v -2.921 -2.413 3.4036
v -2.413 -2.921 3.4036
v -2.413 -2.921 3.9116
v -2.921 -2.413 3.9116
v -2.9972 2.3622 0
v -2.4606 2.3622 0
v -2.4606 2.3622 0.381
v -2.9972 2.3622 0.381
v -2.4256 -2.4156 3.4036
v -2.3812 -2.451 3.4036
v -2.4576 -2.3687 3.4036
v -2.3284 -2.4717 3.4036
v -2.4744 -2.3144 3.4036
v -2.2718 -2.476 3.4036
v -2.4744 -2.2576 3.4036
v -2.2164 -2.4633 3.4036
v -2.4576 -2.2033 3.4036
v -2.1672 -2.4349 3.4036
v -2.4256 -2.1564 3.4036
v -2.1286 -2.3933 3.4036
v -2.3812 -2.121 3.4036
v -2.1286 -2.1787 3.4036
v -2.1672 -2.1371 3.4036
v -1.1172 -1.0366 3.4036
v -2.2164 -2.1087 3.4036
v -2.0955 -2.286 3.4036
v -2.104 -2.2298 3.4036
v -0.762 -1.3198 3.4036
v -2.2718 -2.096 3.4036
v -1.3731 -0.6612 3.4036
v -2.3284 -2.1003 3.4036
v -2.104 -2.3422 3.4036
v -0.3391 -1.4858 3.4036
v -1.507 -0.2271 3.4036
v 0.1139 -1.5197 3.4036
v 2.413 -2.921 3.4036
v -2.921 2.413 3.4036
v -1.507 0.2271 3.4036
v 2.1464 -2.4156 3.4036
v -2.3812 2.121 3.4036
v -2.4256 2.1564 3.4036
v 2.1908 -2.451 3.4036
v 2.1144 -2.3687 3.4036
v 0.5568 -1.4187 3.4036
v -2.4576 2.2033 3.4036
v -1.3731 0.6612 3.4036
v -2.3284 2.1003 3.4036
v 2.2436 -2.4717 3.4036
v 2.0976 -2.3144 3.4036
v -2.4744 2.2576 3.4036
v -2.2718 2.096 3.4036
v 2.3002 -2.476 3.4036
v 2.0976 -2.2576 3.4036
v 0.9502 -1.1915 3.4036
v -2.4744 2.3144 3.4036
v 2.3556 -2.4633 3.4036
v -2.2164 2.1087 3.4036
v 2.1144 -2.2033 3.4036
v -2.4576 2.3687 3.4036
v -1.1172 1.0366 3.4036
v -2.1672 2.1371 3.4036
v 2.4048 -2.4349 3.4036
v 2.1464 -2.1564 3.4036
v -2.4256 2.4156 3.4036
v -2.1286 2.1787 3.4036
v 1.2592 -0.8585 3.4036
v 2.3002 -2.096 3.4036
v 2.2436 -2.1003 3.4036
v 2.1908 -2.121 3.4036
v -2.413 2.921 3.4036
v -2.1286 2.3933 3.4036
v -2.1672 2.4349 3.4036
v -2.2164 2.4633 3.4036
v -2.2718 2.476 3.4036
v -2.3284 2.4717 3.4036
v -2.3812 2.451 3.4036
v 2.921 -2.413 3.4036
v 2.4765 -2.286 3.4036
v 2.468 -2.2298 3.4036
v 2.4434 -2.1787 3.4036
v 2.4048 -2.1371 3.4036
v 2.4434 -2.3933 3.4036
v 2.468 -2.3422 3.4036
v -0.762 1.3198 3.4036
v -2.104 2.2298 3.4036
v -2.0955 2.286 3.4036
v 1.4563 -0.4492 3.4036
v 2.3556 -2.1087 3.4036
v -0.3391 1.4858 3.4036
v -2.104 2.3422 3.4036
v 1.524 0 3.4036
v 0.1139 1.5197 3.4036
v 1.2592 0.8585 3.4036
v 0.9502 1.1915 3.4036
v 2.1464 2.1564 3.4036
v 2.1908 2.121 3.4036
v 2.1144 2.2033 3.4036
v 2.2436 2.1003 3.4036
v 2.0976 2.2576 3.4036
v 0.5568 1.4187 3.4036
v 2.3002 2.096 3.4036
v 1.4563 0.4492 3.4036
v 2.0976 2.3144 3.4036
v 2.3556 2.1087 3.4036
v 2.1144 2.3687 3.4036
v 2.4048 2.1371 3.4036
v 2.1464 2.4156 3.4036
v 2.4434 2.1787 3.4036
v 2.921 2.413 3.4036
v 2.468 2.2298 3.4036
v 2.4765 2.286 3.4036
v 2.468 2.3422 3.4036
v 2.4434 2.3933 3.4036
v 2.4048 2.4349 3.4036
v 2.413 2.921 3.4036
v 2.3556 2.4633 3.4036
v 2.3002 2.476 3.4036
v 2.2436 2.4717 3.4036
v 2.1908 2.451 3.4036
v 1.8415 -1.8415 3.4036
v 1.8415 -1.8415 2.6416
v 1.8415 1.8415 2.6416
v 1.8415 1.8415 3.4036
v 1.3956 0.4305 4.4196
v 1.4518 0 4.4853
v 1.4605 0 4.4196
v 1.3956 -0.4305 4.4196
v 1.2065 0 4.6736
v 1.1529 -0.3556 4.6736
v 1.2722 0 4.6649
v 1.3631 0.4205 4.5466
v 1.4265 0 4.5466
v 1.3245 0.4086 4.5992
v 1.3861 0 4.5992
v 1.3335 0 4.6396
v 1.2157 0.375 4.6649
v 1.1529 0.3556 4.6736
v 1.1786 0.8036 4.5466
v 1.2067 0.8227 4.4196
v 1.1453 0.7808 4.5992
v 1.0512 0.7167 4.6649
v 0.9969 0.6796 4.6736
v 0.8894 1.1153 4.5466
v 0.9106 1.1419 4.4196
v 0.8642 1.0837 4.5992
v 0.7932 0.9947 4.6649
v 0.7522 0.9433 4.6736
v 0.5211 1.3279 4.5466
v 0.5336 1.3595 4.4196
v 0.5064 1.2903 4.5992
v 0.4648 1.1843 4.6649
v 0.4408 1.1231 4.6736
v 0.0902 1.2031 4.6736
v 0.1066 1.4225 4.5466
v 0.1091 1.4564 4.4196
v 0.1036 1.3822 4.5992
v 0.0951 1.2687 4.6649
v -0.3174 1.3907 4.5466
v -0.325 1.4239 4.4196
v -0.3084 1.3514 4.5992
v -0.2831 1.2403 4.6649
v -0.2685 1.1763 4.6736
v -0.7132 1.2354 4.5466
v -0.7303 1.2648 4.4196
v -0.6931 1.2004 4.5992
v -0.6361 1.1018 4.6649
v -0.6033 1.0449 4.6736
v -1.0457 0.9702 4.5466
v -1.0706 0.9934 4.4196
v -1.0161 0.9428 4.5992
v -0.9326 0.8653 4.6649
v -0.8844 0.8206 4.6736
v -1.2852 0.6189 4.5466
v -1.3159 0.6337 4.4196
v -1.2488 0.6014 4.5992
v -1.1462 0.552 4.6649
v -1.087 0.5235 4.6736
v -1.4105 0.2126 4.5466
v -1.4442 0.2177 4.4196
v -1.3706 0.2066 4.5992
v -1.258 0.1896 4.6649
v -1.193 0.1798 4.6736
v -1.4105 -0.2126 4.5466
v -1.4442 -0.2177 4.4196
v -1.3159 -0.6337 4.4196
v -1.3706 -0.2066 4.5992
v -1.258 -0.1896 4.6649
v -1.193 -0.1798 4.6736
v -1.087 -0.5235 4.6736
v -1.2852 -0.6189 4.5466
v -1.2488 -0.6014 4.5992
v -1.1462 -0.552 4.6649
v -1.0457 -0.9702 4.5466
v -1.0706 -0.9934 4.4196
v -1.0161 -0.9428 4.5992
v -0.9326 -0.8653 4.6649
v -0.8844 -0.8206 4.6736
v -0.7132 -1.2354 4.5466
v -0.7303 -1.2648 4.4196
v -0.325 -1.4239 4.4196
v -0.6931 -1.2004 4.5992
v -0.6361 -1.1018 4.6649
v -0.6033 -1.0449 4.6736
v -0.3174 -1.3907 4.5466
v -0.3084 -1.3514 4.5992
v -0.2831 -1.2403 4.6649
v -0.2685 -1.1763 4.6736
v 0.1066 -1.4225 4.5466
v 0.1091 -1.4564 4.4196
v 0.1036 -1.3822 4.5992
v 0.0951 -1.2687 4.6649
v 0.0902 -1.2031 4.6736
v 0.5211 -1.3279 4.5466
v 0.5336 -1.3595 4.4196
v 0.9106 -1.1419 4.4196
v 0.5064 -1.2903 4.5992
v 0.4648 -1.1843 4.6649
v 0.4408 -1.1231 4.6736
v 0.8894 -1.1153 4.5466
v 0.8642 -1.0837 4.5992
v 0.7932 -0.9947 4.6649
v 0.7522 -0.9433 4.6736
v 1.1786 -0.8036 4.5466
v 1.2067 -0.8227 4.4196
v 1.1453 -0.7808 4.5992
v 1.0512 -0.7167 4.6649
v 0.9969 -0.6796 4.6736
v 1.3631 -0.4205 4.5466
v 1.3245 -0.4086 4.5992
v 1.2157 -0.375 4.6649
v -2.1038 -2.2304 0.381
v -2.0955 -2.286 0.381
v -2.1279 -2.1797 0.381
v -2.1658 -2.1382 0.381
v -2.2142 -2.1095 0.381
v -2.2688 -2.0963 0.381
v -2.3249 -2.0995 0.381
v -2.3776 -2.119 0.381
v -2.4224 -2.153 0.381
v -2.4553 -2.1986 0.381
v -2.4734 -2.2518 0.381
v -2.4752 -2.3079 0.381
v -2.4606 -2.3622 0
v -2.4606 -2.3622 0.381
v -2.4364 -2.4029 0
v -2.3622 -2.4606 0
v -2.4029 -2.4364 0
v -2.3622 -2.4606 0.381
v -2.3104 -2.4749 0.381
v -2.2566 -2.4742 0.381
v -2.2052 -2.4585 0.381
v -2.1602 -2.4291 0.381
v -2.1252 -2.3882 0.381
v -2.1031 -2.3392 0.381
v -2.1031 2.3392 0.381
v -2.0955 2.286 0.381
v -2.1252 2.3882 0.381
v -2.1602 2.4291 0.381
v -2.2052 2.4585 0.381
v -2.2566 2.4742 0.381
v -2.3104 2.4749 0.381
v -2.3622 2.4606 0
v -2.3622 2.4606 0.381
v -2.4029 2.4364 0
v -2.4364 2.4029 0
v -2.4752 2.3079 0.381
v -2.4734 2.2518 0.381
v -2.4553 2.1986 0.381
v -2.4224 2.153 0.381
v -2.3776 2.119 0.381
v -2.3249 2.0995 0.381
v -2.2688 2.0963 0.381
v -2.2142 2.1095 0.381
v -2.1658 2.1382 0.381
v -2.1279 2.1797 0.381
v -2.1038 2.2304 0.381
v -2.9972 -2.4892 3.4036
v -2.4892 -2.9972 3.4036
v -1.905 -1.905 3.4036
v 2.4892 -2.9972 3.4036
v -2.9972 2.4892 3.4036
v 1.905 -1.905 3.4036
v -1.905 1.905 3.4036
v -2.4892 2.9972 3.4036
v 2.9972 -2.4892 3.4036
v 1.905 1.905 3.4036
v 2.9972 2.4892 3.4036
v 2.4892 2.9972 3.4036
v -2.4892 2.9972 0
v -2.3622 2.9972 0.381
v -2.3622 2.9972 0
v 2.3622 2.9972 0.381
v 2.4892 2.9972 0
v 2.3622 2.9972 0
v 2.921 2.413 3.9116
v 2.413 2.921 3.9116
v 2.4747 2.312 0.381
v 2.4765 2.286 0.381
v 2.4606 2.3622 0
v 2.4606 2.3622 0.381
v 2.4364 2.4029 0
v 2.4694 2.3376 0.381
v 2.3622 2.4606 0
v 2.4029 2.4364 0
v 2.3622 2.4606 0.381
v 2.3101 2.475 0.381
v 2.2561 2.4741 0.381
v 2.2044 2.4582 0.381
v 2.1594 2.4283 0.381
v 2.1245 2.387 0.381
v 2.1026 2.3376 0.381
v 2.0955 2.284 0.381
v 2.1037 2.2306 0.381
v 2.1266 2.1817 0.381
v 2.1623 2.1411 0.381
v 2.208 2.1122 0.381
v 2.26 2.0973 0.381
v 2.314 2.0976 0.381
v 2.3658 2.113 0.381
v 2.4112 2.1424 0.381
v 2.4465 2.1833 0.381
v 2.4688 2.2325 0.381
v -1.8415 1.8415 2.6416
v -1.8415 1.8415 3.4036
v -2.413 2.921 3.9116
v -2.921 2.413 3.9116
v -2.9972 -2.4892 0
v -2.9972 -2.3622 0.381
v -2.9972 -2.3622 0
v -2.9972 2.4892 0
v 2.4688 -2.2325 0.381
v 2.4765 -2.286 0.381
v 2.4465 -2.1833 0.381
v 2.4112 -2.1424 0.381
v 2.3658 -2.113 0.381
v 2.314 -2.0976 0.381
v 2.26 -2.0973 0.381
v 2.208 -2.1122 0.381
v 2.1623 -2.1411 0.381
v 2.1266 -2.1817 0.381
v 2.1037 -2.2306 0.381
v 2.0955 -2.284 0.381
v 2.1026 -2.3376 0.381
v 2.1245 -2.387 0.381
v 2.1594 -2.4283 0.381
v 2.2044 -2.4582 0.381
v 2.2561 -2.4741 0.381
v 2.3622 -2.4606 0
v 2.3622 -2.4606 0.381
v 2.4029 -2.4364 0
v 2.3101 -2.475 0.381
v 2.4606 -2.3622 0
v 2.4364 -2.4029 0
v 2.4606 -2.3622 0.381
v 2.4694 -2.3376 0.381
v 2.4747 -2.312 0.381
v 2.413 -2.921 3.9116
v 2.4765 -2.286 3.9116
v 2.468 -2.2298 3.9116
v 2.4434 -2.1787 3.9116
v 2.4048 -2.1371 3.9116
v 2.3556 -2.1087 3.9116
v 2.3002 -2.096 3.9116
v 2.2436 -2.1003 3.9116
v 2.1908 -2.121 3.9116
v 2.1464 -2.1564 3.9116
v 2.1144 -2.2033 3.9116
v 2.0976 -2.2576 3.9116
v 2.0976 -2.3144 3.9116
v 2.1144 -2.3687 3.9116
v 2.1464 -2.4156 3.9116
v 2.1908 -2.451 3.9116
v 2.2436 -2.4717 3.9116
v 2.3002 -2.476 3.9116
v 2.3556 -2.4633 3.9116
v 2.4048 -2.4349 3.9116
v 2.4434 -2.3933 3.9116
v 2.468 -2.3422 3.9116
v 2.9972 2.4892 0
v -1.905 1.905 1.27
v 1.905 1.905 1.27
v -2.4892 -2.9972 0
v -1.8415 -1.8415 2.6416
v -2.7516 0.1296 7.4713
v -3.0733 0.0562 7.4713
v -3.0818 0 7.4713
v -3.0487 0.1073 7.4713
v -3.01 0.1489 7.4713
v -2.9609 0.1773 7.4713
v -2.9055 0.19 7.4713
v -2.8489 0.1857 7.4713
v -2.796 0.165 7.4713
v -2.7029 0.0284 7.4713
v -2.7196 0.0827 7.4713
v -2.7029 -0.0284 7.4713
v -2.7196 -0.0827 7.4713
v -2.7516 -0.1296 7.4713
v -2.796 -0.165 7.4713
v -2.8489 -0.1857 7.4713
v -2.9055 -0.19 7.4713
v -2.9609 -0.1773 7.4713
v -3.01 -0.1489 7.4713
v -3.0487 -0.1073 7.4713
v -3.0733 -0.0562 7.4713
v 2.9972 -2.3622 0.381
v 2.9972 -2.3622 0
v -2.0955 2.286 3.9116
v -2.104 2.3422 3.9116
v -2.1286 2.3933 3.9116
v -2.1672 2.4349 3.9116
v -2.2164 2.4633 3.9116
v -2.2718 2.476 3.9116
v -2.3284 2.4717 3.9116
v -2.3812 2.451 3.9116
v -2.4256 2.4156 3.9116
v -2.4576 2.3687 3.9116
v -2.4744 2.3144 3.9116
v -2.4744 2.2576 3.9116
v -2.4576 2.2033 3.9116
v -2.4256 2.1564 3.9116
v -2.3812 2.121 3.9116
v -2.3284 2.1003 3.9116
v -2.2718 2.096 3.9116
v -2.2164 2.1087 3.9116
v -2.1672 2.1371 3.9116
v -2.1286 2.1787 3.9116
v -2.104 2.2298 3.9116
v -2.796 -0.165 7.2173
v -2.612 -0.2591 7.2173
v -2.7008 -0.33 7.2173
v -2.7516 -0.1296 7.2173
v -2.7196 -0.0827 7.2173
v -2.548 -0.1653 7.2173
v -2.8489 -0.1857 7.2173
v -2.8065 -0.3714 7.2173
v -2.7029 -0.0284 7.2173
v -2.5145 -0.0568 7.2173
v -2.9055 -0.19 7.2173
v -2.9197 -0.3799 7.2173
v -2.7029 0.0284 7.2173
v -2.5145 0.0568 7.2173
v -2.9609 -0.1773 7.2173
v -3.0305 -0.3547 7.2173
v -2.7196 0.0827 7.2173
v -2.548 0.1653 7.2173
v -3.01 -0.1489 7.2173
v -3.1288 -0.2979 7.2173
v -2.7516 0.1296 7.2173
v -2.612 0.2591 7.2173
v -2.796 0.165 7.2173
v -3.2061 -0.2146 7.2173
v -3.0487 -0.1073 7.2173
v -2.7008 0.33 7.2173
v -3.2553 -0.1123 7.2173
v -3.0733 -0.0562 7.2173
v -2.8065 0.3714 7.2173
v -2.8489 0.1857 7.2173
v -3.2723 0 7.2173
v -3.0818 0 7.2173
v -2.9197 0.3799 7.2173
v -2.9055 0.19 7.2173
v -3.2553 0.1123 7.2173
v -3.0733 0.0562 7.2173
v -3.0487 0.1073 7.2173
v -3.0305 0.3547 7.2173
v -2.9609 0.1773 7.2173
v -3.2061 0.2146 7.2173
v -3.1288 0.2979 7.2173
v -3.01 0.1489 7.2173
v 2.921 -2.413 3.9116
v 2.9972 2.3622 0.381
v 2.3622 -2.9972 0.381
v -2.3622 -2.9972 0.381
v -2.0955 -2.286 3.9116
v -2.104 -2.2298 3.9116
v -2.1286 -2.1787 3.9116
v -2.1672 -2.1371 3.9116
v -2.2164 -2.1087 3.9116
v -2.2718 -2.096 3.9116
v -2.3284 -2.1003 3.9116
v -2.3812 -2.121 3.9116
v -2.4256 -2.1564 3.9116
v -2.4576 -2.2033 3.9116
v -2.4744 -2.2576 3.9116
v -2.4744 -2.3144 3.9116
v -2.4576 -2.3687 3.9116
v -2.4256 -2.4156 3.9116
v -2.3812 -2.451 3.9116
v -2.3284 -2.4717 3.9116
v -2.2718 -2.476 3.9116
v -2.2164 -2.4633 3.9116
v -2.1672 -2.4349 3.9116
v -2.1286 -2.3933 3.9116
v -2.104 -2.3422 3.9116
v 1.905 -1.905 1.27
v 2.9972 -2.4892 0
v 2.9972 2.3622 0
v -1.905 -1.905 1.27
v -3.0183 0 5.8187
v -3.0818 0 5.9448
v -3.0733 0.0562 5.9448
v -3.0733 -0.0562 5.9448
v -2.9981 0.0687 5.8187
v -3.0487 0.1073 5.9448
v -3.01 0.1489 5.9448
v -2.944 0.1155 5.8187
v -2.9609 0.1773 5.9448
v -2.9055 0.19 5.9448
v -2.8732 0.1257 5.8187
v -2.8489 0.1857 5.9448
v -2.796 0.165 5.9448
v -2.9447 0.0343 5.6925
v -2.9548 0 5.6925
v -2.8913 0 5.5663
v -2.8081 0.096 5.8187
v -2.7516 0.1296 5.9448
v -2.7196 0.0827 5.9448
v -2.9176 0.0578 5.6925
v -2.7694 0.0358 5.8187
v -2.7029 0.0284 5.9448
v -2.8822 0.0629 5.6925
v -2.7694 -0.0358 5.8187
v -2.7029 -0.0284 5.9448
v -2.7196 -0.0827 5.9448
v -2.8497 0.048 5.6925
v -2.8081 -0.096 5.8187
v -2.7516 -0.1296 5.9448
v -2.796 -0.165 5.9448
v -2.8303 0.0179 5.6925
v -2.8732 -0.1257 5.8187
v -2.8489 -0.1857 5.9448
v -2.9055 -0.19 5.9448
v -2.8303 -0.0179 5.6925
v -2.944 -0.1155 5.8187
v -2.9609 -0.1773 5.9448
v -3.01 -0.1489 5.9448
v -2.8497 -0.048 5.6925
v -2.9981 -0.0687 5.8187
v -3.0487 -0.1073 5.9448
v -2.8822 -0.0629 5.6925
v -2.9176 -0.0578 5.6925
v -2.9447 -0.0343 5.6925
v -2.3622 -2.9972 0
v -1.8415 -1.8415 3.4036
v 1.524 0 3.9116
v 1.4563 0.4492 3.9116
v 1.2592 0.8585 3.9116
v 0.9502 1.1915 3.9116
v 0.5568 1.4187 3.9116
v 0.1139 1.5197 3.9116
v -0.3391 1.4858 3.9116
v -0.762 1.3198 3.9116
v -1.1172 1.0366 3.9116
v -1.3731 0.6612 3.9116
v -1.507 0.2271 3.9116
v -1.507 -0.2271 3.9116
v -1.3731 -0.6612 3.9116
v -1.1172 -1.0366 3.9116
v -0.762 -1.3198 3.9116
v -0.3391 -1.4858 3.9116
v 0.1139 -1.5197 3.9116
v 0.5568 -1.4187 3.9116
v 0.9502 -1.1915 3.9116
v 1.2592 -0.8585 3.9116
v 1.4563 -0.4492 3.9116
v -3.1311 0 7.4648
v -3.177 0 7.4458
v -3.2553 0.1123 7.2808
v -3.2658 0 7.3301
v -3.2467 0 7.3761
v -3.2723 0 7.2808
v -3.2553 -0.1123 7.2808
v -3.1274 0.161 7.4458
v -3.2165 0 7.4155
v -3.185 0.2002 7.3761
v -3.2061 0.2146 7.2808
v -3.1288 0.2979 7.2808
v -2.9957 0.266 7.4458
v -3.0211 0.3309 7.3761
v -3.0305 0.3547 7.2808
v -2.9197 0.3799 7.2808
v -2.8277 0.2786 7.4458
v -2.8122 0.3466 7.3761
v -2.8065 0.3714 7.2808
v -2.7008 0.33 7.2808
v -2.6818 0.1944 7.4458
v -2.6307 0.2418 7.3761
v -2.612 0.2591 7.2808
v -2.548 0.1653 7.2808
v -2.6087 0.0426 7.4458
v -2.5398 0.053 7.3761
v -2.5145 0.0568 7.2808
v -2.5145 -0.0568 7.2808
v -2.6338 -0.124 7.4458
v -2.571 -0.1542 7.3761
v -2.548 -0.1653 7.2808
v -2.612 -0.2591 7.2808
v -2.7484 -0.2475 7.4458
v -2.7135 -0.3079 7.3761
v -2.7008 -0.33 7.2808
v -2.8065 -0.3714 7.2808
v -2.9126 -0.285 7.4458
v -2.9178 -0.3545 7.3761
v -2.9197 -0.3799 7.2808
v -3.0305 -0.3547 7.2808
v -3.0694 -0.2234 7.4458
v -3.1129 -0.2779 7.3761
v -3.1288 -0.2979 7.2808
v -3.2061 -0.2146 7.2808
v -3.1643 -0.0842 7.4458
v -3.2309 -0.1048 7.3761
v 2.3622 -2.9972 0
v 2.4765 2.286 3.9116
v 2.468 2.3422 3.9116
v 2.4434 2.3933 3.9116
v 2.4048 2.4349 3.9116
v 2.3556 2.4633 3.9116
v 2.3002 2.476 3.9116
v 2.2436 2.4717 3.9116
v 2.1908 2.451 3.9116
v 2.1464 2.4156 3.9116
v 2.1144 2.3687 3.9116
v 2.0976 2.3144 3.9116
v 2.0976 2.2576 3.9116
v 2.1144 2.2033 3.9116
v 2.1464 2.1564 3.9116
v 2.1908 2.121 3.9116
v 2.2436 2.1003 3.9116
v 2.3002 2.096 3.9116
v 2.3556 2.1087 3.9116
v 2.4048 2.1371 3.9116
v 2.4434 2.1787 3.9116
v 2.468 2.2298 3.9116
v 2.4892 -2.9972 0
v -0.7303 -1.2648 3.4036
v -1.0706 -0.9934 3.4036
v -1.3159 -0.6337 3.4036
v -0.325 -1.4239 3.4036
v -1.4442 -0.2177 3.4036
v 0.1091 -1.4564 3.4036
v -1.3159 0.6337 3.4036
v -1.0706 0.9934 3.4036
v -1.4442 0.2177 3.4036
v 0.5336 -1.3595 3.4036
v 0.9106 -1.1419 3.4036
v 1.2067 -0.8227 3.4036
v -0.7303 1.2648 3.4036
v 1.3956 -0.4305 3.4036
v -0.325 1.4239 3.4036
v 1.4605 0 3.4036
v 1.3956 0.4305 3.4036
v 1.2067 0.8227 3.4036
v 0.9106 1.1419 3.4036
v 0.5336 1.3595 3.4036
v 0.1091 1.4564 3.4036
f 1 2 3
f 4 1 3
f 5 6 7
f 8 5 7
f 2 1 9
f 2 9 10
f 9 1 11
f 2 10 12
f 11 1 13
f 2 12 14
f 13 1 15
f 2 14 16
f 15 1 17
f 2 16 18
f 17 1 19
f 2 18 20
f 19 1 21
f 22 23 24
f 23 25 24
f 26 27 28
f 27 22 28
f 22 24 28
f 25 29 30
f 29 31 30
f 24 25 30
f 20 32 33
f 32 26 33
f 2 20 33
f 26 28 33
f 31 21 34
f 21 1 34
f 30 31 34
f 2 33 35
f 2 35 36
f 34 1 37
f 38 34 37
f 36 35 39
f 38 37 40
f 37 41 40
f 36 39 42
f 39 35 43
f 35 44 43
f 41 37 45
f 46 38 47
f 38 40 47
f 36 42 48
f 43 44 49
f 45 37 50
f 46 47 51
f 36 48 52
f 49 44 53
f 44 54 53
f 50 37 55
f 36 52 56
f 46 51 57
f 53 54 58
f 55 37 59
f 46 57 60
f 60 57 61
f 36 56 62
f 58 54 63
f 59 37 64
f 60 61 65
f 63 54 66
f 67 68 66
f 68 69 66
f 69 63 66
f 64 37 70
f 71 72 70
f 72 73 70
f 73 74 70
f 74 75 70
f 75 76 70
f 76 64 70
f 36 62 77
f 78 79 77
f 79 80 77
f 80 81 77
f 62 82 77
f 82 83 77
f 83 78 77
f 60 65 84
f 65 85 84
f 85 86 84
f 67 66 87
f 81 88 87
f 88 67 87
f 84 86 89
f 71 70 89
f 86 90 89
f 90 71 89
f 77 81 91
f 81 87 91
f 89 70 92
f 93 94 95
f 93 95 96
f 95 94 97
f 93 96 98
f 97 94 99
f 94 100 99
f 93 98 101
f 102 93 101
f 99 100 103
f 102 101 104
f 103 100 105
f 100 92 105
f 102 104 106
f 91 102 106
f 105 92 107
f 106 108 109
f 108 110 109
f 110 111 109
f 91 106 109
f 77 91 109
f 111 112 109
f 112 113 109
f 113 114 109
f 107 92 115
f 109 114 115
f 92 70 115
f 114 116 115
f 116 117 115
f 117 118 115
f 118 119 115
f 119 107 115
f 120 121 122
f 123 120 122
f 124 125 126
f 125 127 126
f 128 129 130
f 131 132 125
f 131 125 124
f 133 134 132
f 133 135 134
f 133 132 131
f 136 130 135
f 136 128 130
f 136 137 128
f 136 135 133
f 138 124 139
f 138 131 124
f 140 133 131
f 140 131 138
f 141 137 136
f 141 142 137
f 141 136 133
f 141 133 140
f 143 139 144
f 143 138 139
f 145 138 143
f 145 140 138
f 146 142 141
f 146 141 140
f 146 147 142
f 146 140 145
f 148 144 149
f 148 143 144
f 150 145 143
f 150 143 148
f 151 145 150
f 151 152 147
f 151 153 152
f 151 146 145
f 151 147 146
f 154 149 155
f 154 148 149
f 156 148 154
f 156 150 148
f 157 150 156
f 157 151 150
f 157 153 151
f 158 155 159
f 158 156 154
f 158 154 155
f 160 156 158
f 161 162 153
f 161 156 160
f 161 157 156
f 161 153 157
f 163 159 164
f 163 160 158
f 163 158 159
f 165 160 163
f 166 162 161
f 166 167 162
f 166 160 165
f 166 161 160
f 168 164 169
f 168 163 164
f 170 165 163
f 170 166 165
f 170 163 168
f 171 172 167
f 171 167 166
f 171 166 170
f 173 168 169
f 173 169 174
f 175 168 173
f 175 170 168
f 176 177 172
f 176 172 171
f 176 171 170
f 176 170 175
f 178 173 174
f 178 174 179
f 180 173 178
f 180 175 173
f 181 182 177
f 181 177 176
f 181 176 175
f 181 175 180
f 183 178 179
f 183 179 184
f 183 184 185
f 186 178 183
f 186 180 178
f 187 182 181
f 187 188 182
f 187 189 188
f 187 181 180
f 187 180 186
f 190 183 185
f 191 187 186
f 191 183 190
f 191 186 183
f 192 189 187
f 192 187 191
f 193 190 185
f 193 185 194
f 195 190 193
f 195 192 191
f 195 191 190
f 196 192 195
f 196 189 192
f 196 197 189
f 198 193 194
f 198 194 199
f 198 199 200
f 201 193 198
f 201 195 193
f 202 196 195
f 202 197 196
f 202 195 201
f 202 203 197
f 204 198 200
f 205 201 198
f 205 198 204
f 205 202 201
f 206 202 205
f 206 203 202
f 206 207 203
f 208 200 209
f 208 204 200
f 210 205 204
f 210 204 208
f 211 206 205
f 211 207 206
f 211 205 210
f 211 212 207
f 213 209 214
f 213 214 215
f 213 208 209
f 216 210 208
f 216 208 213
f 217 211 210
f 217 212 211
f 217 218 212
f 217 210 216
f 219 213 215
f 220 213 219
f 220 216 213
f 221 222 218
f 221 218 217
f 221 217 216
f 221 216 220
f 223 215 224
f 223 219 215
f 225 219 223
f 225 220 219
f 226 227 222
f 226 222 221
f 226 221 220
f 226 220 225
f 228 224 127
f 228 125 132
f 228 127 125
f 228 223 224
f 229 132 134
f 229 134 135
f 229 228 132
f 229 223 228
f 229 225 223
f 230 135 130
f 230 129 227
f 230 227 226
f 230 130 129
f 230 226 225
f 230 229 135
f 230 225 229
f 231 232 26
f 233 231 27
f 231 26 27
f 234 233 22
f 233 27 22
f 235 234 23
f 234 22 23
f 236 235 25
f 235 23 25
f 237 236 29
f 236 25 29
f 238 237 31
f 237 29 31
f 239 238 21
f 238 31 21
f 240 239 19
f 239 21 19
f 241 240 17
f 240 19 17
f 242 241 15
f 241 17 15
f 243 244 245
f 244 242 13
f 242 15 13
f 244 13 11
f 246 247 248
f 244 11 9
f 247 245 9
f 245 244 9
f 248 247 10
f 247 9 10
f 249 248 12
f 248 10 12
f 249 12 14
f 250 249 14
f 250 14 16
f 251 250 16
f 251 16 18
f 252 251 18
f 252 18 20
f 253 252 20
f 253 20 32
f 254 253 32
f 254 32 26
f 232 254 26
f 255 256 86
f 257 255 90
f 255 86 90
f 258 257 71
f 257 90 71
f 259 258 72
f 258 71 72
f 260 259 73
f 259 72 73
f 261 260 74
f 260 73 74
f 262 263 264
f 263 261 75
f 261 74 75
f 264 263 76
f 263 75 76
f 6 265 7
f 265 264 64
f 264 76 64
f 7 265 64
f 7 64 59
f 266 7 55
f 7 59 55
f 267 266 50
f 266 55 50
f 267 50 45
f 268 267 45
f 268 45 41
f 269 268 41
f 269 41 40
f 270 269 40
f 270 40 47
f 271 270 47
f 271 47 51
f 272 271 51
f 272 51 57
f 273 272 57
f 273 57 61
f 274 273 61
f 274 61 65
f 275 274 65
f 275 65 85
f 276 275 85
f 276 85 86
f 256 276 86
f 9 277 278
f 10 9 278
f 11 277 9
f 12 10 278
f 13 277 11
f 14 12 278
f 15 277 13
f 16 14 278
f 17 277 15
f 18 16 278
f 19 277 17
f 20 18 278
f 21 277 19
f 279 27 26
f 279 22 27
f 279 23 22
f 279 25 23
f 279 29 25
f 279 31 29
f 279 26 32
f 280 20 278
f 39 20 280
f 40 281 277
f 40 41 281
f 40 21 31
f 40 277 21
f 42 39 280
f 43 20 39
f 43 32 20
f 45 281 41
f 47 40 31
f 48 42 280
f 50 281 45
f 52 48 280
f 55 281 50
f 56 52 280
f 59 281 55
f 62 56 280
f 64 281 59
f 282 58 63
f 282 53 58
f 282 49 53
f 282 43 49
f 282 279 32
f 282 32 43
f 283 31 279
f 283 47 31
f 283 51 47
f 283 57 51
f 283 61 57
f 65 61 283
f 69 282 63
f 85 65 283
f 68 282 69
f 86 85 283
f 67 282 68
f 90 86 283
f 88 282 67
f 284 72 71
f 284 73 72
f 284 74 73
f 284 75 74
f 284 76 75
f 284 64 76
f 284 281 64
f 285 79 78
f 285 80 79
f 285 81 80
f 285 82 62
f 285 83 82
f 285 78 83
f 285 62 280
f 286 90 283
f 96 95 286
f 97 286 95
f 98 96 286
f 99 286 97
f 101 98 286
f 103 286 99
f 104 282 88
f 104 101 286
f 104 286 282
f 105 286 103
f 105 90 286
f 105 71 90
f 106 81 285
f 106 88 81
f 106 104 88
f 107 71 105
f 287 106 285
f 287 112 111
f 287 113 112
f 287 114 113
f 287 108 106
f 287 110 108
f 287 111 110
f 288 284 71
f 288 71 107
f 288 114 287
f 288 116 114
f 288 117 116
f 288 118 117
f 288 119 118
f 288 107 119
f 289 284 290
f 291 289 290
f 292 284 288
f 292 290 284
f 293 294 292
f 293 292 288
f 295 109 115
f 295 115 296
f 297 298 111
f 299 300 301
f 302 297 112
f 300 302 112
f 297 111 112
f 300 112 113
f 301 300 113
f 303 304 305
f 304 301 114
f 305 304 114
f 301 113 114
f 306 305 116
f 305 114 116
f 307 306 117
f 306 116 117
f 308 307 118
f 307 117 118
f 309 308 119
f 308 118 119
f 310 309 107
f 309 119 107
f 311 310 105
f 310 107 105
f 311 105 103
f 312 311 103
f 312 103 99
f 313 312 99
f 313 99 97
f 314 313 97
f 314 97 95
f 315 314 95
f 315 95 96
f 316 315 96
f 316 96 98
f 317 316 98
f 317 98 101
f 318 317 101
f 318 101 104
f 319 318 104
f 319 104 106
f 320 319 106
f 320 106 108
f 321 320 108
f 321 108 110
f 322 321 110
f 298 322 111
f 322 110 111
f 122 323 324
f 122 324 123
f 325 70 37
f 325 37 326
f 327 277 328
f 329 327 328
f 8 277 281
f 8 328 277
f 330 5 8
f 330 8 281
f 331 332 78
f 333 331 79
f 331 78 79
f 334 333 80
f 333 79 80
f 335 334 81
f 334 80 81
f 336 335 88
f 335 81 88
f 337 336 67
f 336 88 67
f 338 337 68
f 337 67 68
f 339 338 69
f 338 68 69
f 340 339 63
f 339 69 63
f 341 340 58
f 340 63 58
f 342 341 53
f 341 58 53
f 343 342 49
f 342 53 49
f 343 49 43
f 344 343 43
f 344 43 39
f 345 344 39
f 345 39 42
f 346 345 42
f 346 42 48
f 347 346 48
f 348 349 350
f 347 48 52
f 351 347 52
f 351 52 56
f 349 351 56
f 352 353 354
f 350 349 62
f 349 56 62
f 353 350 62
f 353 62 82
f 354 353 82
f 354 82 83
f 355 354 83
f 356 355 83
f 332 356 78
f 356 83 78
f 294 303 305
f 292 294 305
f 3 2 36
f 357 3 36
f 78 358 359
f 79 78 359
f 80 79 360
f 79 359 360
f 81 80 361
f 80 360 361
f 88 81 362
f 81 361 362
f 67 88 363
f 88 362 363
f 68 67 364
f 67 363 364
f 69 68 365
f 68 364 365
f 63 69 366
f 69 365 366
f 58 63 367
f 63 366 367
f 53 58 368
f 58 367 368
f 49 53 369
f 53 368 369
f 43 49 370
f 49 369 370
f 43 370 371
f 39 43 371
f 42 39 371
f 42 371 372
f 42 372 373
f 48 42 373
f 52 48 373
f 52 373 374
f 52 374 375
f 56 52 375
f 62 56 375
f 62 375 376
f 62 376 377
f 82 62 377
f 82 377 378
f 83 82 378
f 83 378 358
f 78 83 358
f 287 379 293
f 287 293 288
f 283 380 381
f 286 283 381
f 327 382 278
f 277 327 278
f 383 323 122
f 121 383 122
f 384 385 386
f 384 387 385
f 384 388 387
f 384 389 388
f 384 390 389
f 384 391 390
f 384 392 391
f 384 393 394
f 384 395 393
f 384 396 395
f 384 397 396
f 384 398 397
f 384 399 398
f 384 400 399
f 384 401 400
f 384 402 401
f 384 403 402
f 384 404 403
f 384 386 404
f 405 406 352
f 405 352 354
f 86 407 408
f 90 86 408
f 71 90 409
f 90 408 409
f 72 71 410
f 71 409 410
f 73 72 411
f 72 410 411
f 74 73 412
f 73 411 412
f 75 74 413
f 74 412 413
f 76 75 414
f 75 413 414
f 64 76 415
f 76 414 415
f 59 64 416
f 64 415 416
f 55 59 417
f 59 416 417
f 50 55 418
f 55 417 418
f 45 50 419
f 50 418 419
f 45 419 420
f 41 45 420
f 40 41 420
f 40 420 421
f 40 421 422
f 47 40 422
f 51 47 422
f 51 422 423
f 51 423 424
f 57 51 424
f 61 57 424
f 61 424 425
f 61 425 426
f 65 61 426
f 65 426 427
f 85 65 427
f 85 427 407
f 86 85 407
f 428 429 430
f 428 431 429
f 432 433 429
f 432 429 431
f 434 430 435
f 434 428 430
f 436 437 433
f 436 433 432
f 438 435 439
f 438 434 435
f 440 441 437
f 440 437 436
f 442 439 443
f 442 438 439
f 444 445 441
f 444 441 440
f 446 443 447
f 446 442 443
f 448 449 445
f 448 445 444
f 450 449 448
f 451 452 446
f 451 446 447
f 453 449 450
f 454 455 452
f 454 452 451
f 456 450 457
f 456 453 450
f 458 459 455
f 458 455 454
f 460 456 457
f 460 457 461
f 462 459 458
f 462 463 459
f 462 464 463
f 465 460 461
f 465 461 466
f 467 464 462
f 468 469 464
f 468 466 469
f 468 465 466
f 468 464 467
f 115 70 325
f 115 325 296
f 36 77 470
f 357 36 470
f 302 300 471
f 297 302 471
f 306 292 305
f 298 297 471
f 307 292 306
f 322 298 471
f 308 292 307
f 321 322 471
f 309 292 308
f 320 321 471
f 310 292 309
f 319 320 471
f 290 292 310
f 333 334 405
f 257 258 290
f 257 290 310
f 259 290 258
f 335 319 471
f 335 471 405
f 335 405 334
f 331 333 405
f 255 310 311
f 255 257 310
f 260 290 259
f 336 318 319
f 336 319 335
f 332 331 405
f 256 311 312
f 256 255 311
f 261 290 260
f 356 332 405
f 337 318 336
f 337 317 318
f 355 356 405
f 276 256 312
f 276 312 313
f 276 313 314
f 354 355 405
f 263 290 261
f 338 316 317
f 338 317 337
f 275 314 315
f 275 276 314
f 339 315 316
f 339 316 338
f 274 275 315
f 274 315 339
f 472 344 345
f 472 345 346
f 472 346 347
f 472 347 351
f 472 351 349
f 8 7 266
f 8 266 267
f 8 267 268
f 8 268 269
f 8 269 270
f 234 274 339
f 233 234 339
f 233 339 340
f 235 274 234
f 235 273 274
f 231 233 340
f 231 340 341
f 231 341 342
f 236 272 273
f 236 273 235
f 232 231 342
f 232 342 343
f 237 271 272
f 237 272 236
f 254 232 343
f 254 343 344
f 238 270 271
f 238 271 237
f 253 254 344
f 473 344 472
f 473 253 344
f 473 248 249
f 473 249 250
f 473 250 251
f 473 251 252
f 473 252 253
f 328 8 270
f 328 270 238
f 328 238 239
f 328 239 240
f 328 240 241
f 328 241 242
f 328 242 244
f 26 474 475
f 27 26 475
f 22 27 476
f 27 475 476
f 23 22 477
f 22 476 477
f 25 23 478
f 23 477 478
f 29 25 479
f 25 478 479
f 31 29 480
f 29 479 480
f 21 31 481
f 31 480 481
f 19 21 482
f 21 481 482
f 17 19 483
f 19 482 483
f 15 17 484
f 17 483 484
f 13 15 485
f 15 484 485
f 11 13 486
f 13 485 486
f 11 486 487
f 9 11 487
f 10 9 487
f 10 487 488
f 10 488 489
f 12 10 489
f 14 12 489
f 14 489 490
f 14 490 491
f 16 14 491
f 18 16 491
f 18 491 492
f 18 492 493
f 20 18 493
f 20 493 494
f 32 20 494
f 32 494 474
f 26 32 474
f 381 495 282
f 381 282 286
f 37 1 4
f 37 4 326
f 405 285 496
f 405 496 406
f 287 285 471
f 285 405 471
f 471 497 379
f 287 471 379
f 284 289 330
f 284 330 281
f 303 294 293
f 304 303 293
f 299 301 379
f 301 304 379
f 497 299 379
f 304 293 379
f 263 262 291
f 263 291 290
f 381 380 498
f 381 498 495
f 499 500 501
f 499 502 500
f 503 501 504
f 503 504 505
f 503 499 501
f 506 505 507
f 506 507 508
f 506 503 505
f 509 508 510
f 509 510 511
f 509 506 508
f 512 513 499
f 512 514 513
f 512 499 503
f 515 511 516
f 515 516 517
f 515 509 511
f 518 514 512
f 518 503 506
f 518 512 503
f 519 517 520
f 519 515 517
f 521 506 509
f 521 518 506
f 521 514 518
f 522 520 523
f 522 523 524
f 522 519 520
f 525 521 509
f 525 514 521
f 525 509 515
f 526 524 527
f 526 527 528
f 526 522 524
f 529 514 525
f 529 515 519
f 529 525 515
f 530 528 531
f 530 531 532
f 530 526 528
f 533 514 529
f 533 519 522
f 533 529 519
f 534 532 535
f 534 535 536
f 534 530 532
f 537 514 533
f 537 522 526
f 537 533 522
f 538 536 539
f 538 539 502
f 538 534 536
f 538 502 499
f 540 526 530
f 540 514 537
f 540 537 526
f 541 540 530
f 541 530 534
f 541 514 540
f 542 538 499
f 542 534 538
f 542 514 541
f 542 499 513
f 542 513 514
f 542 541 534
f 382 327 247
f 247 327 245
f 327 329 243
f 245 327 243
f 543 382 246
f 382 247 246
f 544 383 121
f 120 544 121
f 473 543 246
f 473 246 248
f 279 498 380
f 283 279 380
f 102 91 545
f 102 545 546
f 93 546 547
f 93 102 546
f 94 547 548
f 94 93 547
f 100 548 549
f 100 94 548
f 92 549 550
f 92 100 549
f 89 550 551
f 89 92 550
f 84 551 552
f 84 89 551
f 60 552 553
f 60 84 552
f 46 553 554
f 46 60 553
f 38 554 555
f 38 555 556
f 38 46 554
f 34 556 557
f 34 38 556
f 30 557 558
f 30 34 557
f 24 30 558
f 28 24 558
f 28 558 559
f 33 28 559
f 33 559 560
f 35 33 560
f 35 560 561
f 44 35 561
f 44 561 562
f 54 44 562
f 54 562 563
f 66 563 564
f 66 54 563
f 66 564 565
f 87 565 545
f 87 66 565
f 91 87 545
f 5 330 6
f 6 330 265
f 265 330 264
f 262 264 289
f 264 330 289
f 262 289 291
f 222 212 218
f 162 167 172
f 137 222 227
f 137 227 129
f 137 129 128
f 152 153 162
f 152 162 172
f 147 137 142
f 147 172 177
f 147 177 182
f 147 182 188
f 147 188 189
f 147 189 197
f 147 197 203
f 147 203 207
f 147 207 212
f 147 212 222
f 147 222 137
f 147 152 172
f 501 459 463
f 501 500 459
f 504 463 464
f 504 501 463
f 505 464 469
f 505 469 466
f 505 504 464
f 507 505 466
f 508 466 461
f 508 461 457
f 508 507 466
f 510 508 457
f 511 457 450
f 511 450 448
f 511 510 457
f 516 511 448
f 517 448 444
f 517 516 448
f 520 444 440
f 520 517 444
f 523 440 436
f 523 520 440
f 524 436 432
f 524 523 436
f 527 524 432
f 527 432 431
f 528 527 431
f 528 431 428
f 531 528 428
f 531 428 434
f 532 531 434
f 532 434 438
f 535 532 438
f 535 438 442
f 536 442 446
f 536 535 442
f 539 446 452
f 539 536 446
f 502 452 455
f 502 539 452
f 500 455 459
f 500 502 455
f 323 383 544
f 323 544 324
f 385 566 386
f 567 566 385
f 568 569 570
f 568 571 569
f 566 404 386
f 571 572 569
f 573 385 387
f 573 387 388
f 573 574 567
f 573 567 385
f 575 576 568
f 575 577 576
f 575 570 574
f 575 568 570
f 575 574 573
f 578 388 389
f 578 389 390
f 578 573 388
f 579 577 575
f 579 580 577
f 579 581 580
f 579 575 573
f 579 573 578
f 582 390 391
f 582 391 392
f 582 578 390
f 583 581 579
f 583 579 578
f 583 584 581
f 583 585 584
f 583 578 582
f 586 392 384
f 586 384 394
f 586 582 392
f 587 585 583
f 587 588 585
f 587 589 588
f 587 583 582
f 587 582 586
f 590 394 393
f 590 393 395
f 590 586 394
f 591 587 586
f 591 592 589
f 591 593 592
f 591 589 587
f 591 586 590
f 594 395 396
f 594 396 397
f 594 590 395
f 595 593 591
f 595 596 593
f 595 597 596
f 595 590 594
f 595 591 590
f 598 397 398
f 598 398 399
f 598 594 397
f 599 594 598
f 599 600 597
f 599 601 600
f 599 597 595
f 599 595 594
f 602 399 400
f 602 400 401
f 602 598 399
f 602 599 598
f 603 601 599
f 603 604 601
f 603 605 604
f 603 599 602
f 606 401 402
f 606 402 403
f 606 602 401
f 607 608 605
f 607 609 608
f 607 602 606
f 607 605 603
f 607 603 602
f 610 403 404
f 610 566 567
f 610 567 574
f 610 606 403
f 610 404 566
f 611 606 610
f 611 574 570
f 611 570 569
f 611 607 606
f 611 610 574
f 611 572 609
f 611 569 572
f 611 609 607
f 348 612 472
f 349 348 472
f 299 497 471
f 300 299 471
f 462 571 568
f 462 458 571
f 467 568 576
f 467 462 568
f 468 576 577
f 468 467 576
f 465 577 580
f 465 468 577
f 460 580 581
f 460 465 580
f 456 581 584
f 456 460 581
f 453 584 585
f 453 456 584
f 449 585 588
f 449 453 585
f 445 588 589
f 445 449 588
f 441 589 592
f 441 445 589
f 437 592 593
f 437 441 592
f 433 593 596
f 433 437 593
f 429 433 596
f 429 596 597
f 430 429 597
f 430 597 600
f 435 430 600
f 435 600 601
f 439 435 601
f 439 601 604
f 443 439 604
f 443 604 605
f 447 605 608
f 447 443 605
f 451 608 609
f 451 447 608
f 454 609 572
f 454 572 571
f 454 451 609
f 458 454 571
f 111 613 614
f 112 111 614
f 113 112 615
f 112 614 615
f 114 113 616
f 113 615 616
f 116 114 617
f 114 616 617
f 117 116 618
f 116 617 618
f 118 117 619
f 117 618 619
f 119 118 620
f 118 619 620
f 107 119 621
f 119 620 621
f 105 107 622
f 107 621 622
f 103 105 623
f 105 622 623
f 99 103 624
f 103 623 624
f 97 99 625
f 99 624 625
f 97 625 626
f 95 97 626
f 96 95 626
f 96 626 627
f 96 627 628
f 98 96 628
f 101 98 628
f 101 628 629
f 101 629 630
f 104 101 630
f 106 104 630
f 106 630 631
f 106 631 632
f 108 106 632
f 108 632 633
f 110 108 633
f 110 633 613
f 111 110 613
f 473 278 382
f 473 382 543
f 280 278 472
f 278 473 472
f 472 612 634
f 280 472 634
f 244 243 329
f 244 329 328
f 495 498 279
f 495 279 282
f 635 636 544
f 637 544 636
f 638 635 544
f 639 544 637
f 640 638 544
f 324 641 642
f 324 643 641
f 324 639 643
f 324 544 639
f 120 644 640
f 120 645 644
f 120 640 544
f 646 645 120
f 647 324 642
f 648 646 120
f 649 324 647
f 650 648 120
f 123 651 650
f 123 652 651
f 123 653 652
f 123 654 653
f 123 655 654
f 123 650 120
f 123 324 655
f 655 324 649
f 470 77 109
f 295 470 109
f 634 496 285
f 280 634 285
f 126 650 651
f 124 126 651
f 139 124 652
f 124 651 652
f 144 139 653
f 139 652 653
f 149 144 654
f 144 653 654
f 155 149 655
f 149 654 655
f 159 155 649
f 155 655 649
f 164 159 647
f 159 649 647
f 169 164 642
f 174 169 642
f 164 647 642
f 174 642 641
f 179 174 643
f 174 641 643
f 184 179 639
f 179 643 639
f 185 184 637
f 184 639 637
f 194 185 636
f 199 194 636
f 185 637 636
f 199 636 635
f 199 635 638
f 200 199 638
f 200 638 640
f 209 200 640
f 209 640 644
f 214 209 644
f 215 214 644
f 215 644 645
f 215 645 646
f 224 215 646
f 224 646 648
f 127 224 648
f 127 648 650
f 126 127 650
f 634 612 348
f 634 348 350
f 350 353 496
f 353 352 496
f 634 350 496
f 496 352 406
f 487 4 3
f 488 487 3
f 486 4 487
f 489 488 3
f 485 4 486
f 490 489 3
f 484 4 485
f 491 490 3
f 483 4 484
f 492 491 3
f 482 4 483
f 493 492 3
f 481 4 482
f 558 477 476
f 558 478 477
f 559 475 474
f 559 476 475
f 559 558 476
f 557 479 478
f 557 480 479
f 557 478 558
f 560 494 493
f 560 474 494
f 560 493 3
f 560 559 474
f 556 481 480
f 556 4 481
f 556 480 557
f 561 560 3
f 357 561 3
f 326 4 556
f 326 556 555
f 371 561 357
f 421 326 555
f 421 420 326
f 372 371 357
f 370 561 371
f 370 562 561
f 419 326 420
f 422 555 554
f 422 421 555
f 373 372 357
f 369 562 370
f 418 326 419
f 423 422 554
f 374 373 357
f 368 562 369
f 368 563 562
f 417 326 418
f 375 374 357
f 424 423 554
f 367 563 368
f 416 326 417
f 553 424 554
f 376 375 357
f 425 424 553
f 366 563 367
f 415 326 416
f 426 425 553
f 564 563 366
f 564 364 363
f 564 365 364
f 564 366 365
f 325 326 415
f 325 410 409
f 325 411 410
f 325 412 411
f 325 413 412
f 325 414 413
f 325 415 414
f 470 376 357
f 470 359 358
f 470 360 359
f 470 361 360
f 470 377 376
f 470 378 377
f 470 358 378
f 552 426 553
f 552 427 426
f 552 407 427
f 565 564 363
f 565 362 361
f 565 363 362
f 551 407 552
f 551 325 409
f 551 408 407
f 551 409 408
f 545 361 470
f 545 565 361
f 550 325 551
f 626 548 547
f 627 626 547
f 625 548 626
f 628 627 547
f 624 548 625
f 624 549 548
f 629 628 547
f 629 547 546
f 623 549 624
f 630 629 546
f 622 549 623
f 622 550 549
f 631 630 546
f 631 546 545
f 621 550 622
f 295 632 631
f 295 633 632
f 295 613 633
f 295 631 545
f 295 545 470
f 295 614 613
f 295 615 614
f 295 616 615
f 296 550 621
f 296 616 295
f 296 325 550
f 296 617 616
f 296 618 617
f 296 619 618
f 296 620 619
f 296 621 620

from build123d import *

# Parameters (mm, degrees)
F0_W      = 5.9944
F0_H      = 5.9944
F0_W_2    = 3.81
F0_H_2    = 3.81
F1_DEPTH  = 3.4036
F2_DEPTH  = 1.27
F3_W      = 4.7244
F3_H      = 0.381
F4_DEPTH  = 5.9944
F5_SIZE   = 0.508
F6_W      = 5.842
F6_H      = 5.842
F6_R      = 1.524
F7_DEPTH  = 0.508
F8_SIZE   = 0.508
F9_W      = 4.7244
F9_H      = 0.381
F10_DEPTH = 5.9944
F11_R     = 0.1905
F12_DEPTH = 25.4
F14_W     = 3.683
F14_H     = 3.683
F14_R     = 1.4605
F15_DEPTH = 0.762
F16_DEPTH = 2.032
F17_R     = 0.254


with BuildPart() as f1:
    # F0 (on Top) → F1 (new body)
    with BuildSketch(Plane.XY):
        Rectangle(F0_W, F0_H)
        Rectangle(F0_W_2, F0_H_2, mode=Mode.SUBTRACT)
    extrude(amount=F1_DEPTH)

    # F0 (on Top) → F2 (join)
    with BuildSketch(Plane.XY):
        Rectangle(F0_W_2, F0_H_2)
    extrude(amount=F2_DEPTH)

    # F3 (on face) → F4 (cut, through all)
    with BuildSketch(Plane.XZ.offset(2.9972)):
        with Locations((0, 0.1905)):
            Rectangle(F3_W, F3_H)
    extrude(amount=-F4_DEPTH, mode=Mode.SUBTRACT)

    # F5
    f5_edges = [f1.edges().sort_by_distance(p)[0] for p in [
        (-2.9972, -2.9972, 1.7018),
        (-2.9972, 2.9972, 1.7018),
        (2.9972, -2.9972, 1.7018),
        (2.9972, 2.9972, 1.7018),
    ]]
    chamfer(f5_edges, length=F5_SIZE)

    # F9 (on face) → F10 (cut, through all)
    with BuildSketch(Plane(origin=(-2.9972, 0, 0), x_dir=(0, -1, 0), z_dir=(-1, 0, 0))):
        with Locations((0, 0.1905)):
            Rectangle(F9_W, F9_H)
    extrude(amount=-F10_DEPTH, mode=Mode.SUBTRACT)


with BuildPart() as f7:
    # F6 (on face) → F7 (new body)
    with BuildSketch(Plane.XY.offset(3.4036)):
        Rectangle(F6_W, F6_H)
        Circle(F6_R, mode=Mode.SUBTRACT)
    extrude(amount=F7_DEPTH)

    # F8
    f8_edges = [f7.edges().sort_by_distance(p)[0] for p in [
        (-2.921, -2.921, 3.6576),
        (-2.921, 2.921, 3.6576),
        (2.921, 2.921, 3.6576),
        (2.921, -2.921, 3.6576),
    ]]
    chamfer(f8_edges, length=F8_SIZE)


with BuildPart() as f12_tool:
    # F11 (on face) → F12 (new body)
    with BuildSketch(Plane.XY.offset(3.9116)):
        with Locations((-2.286, 2.286)):
            Circle(F11_R)
        with Locations((-2.286, -2.286)):
            Circle(F11_R)
        with Locations((2.286, 2.286)):
            Circle(F11_R)
        with Locations((2.286, -2.286)):
            Circle(F11_R)
    extrude(amount=-F12_DEPTH)


with BuildPart() as f1_1:
    add(f1.part)

    # F12: cut by f12_tool
    add(f12_tool.part, mode=Mode.SUBTRACT)


with BuildPart() as f7_1:
    add(f7.part)

    # F12: cut by f12_tool
    add(f12_tool.part, mode=Mode.SUBTRACT)


with BuildPart() as f15:
    # F14 (on offset) → F15 (new body, through all)
    with BuildSketch(Plane.XY.offset(2.6416)):
        Rectangle(F14_W, F14_H)
        Circle(F14_R, mode=Mode.SUBTRACT)
    extrude(amount=F15_DEPTH)

    # F14 (on offset) → F16 (join)
    with BuildSketch(Plane.XY.offset(2.6416)):
        Circle(F14_R)
    extrude(amount=F16_DEPTH)

    # F17
    f17_edges = [f15.edges().sort_by_distance(p)[0] for p in [
        (-1.4605, 0, 4.6736),
    ]]
    fillet(f17_edges, radius=F17_R)


with BuildPart() as f19:
    # F18 (on Front) → F19 (revolve)
    with BuildSketch(Plane.XZ):
        with BuildLine():
            Line((-3.0817589723, 5.9448182583), (-2.8912589723, 5.5663371459))
            Line((-2.8912589723, 5.5663371459), (-2.8912589723, 7.4713371459))
            Line((-2.8912589723, 7.4713371459), (-3.0817589723, 7.4713371459))
            ThreePointArc((-3.0817589723, 7.4713371459), (-3.2164628141, 7.4155409877), (-3.2722589723, 7.2808371459))
            Line((-3.2722589723, 7.2808371459), (-3.2722589723, 7.2173371459))
            Line((-3.2722589723, 7.2173371459), (-3.0817589723, 7.2173371459))
            Line((-3.0817589723, 7.2173371459), (-3.0817589723, 5.9448182583))
        make_face()
    revolve(axis=Axis((-2.8912589723, 0, 7.2813290171), (0, 0, -1)))


solid = Compound([f1_1.part, f7_1.part, f15.part, f19.part])
